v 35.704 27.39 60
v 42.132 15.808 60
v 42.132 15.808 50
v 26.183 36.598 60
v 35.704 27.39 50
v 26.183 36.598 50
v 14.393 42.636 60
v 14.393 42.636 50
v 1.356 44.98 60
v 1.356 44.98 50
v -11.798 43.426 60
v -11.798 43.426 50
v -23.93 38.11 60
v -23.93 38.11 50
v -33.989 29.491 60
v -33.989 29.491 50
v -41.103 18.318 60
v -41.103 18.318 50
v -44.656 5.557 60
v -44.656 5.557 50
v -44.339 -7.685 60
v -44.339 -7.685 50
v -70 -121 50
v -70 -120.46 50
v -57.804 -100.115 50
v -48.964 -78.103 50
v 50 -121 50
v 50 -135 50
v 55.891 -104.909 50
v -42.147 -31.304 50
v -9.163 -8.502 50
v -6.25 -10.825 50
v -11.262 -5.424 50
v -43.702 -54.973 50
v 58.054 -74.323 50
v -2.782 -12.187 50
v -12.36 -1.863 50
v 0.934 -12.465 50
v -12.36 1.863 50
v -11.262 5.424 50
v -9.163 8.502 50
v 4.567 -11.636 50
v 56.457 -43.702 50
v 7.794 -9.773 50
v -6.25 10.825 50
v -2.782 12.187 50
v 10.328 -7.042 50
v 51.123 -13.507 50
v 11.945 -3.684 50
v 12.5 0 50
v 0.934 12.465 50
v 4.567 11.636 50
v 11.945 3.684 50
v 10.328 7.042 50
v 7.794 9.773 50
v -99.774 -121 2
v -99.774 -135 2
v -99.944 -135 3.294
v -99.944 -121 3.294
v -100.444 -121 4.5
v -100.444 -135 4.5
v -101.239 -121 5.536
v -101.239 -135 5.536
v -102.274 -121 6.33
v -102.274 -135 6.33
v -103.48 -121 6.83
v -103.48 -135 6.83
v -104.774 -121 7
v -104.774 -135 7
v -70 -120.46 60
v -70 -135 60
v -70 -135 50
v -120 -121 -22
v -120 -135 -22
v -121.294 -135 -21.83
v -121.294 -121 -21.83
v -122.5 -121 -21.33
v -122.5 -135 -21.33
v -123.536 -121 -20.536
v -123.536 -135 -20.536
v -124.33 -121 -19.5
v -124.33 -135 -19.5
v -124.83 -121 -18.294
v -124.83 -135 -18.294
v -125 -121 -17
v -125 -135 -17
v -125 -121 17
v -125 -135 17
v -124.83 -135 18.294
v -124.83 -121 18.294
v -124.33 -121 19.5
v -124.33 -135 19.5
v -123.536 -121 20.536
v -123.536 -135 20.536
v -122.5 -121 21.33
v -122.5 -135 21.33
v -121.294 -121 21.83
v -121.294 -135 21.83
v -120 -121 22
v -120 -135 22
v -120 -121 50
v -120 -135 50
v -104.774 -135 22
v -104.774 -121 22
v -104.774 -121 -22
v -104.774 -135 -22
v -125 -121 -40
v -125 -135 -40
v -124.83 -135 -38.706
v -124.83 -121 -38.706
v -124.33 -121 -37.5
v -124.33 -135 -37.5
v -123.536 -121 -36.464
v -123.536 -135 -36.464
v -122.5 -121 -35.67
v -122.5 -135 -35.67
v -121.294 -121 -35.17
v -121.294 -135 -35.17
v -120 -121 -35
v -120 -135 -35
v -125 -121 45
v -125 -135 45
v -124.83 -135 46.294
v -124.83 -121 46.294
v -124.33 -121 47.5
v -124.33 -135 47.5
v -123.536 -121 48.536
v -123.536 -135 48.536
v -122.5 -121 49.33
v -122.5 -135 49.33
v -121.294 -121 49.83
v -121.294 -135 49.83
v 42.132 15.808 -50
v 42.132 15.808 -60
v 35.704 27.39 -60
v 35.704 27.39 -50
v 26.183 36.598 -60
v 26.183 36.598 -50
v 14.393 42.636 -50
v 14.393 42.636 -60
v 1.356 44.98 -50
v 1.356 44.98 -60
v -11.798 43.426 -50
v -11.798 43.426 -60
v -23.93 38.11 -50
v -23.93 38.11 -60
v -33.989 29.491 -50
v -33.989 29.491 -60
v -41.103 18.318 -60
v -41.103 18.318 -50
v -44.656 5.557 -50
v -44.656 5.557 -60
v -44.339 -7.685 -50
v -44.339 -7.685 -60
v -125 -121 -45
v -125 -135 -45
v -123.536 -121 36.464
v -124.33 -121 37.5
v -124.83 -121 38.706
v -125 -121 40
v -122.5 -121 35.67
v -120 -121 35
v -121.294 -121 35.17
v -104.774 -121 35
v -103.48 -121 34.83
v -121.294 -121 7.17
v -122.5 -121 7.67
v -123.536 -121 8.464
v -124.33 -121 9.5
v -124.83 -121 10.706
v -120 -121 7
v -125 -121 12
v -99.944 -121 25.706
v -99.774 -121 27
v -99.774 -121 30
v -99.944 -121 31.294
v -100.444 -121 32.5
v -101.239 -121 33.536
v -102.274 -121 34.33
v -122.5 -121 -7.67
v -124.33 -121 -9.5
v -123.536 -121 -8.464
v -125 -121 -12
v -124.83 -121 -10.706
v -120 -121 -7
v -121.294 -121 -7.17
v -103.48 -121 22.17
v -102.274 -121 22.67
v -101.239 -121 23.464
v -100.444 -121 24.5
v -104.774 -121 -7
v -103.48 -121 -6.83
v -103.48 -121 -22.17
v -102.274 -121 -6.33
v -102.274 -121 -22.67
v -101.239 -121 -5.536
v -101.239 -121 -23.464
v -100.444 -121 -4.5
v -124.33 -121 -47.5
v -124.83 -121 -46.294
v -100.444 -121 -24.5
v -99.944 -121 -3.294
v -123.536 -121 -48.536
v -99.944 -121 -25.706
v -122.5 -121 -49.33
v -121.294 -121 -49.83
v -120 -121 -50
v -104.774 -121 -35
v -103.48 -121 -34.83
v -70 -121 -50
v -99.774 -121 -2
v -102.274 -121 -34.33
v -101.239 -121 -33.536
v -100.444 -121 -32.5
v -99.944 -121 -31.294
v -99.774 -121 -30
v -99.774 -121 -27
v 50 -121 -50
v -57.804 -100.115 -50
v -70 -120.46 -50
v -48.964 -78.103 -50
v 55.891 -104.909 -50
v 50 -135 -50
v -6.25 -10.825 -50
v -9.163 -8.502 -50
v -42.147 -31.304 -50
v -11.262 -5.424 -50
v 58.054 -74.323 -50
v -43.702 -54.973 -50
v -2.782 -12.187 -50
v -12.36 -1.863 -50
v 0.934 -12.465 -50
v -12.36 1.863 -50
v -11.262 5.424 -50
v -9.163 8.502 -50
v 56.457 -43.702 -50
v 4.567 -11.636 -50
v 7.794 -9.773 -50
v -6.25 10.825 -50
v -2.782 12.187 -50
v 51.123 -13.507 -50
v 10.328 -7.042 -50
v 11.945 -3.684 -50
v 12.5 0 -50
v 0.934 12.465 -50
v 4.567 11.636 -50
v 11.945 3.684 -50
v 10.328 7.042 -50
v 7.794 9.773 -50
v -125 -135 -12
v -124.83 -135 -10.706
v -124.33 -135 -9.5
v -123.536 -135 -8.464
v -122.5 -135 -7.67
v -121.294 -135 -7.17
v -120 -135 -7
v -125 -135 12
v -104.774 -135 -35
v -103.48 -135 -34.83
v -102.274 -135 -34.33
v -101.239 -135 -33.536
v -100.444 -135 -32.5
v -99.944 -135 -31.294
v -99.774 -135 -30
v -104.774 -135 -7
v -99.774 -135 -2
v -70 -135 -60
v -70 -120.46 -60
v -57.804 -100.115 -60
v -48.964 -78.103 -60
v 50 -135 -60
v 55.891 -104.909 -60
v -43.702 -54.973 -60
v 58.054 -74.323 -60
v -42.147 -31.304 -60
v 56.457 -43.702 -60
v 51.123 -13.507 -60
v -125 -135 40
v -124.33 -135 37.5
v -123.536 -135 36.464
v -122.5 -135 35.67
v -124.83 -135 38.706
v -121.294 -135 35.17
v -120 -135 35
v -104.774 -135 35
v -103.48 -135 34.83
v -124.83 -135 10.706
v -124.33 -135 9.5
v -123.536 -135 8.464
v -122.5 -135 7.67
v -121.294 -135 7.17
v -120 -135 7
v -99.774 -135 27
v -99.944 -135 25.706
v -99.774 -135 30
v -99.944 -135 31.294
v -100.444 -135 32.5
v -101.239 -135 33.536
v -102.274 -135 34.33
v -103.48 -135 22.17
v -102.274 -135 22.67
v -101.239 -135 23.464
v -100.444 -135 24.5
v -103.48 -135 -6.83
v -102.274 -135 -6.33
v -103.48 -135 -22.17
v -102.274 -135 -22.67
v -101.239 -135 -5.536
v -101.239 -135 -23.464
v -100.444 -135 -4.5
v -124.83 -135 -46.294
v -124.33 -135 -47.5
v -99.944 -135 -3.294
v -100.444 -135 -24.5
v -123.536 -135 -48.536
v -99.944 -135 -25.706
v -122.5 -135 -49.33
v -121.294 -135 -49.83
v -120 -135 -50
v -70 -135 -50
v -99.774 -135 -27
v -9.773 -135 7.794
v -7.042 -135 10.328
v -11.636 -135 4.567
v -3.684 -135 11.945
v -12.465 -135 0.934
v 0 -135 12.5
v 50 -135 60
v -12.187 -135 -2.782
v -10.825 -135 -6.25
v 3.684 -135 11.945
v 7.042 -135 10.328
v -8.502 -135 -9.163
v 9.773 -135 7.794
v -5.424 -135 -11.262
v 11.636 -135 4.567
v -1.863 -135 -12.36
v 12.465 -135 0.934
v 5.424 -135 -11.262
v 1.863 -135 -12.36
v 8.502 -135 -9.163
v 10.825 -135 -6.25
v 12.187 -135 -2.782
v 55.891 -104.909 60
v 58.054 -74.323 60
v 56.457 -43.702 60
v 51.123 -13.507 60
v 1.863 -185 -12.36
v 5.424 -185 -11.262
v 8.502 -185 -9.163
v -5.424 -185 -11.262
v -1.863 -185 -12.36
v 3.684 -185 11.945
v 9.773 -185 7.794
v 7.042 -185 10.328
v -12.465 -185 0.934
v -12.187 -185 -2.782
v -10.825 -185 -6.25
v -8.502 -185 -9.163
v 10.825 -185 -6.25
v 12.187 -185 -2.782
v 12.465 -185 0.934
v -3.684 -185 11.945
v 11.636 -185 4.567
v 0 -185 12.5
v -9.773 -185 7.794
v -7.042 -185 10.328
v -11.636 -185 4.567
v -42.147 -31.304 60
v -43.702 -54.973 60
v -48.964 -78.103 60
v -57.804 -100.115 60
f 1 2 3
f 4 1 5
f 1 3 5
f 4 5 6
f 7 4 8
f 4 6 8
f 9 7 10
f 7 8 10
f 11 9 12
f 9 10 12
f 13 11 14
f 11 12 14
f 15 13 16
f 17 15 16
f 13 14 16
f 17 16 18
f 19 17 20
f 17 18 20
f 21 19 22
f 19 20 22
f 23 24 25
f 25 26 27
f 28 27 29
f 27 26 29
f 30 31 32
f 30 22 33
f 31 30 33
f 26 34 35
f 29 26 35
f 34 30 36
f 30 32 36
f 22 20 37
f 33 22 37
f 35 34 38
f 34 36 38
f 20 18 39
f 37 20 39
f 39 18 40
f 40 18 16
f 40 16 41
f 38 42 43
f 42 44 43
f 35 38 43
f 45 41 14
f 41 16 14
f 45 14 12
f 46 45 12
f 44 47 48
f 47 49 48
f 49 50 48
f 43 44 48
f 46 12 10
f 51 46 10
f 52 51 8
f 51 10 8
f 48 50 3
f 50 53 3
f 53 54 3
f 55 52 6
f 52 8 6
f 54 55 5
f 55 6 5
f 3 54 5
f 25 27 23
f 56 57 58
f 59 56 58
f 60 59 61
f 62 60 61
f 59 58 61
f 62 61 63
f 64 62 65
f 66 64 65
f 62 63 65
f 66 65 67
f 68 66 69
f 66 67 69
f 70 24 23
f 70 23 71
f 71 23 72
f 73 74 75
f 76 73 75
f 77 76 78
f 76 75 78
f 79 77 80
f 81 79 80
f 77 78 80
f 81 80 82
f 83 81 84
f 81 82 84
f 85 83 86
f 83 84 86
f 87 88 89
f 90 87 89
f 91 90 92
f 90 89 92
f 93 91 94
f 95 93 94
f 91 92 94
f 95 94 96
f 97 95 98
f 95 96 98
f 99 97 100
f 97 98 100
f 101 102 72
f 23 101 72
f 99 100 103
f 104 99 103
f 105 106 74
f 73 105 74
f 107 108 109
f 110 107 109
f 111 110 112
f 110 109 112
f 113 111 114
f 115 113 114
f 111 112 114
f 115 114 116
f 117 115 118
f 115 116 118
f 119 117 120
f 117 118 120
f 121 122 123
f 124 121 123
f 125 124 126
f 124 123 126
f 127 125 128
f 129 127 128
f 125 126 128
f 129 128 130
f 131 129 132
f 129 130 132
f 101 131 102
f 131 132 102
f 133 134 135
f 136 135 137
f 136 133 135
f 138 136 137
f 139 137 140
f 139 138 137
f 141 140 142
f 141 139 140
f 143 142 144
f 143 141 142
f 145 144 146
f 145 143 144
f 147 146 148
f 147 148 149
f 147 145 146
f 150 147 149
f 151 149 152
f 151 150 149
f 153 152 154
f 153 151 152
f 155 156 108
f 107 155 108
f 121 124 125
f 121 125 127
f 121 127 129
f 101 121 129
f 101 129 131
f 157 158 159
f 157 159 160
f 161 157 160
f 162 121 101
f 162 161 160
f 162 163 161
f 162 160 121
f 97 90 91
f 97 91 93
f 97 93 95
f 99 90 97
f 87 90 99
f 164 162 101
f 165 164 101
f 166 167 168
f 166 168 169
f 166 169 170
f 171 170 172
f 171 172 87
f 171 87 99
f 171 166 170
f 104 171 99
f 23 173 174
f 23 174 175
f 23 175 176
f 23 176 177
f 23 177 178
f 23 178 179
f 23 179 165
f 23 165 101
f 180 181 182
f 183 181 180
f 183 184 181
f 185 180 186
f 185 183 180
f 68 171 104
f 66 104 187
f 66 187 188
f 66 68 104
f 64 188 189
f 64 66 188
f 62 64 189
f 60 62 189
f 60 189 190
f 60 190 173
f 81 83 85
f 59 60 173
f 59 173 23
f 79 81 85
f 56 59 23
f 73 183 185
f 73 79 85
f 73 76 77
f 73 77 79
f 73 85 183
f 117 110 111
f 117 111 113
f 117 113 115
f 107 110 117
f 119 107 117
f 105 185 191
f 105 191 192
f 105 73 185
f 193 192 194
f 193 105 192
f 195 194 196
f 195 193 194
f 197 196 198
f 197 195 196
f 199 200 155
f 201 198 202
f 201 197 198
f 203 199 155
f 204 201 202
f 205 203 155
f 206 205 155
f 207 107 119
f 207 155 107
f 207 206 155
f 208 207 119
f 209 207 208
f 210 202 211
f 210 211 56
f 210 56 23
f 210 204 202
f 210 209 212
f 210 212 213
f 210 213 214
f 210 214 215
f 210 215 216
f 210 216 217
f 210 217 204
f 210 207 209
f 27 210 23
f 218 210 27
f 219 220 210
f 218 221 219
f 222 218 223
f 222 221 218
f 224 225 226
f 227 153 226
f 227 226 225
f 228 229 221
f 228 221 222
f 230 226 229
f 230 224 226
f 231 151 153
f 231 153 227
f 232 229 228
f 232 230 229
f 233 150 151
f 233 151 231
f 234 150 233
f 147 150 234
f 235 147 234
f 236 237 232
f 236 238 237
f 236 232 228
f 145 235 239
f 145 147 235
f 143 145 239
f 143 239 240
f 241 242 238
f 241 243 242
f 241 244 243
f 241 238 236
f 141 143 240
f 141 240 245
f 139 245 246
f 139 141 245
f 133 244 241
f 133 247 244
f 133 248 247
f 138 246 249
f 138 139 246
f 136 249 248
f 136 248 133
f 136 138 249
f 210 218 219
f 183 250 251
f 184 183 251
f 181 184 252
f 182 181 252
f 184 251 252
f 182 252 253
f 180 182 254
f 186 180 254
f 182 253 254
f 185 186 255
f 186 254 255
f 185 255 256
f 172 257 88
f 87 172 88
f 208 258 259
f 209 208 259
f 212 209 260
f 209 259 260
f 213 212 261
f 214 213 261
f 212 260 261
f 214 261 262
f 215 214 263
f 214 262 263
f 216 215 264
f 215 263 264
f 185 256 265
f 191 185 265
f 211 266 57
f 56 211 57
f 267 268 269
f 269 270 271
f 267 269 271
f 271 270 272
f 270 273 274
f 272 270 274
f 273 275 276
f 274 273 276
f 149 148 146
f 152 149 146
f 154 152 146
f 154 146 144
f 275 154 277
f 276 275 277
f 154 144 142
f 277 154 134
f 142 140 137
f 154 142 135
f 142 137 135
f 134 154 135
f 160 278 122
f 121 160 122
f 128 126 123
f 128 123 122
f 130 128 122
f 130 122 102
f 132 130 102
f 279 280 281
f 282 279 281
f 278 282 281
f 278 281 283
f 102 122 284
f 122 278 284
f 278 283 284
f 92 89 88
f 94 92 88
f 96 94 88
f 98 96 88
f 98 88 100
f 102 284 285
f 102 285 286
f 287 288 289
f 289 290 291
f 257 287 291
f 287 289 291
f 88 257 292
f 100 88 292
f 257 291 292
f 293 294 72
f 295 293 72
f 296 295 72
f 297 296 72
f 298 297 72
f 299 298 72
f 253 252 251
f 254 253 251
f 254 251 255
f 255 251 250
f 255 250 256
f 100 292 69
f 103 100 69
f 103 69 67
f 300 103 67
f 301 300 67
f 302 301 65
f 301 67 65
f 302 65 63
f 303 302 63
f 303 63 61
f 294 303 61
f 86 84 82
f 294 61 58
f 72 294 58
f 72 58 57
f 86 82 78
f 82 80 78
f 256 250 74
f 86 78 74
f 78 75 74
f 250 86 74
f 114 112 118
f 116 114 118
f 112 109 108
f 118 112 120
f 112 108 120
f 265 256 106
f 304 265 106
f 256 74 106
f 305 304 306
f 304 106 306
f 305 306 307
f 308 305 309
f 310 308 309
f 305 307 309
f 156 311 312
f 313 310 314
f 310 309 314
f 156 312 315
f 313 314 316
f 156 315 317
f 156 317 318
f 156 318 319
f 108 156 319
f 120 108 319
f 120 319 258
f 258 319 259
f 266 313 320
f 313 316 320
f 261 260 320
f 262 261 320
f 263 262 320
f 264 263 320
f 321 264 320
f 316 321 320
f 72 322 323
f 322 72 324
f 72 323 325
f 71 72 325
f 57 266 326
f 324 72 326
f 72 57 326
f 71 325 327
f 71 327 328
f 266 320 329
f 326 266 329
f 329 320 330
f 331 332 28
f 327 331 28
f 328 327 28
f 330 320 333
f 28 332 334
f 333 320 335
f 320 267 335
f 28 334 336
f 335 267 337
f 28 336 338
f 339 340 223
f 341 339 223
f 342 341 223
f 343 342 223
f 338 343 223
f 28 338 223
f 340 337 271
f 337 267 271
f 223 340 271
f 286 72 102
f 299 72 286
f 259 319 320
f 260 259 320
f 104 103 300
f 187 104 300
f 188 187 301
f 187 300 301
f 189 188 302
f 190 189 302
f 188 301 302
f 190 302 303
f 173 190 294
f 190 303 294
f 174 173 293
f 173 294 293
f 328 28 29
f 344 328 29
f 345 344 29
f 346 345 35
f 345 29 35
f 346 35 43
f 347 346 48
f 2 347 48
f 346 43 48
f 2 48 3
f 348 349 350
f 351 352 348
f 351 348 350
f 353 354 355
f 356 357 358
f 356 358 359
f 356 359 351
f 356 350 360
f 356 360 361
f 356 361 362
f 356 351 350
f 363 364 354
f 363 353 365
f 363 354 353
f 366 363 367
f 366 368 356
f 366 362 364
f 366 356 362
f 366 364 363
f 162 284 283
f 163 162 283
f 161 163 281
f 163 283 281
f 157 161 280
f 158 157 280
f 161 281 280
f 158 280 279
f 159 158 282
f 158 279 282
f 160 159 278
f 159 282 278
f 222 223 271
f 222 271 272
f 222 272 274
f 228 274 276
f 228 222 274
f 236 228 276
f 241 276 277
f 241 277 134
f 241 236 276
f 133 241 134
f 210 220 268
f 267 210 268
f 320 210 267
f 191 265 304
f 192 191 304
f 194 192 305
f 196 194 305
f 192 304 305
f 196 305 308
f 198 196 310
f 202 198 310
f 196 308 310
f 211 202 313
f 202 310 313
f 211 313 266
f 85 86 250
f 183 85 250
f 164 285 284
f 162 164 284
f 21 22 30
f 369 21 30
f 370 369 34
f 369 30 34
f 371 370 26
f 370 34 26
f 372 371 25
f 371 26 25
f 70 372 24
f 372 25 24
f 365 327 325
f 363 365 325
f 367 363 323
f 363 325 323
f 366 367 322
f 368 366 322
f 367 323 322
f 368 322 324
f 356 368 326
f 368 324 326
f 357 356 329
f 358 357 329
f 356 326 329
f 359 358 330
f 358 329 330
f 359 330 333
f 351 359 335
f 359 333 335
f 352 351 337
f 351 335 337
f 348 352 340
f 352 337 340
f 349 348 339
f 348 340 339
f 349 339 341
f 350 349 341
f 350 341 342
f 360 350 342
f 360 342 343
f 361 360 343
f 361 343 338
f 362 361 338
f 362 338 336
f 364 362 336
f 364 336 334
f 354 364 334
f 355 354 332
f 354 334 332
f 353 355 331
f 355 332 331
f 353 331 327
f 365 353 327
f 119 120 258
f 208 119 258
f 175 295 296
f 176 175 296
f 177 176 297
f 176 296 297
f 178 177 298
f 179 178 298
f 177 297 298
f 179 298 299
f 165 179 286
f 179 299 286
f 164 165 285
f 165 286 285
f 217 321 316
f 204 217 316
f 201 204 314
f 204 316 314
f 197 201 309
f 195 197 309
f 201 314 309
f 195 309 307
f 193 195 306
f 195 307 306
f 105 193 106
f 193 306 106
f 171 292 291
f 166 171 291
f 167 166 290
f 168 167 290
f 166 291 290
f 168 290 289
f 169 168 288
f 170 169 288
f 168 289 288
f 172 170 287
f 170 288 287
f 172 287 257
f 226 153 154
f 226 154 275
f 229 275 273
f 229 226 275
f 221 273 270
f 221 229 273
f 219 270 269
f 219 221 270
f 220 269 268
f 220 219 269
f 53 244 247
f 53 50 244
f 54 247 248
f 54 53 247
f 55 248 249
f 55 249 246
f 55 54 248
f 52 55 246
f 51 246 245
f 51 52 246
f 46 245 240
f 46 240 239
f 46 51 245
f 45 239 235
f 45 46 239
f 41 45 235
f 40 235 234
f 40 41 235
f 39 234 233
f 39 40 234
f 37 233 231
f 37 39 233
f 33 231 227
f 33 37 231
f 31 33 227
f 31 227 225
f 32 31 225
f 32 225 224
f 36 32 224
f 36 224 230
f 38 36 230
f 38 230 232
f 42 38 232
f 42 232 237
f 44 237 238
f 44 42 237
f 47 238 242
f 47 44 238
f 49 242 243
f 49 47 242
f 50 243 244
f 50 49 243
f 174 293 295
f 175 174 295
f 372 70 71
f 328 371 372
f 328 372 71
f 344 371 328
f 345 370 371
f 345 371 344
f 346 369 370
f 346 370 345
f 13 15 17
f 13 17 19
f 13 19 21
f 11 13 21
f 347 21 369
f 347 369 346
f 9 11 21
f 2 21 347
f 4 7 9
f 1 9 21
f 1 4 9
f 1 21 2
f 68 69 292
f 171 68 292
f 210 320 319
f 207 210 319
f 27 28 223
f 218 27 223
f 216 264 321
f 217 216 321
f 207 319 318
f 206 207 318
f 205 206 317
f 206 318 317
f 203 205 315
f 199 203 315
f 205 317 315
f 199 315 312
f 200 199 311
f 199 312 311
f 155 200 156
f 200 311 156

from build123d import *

# Parameters (mm, degrees)
SKETCH1_R           = 12.5
BOSS_EXTRUDE1_DEPTH = 50
BOSS_EXTRUDE2_DEPTH = 10
BOSS_EXTRUDE3_DEPTH = 14
SKETCH4_R           = 12.5
BOSS_EXTRUDE4_DEPTH = 50


with BuildPart() as part:
    # Sketch1 → Boss-Extrude1 (new, symmetric)
    with BuildSketch(Plane.XY):
        Circle(SKETCH1_R)
    extrude(amount=BOSS_EXTRUDE1_DEPTH, both=True)

    # Sketch2 → Boss-Extrude2 (add)
    with BuildSketch(Plane.XY.offset(50)):
        with BuildLine():
            Line((0, -135), (50, -135))
            ThreePointArc((50, -135), (57.725254986, -58.987850945), (42.132117825, 15.807740116))
            ThreePointArc((42.132117825, 15.807740116), (-11.798039133, 43.425871006), (-44.338945511, -7.684914504))
            ThreePointArc((-44.338945511, -7.684914504), (-45.875603416, -66.642123234), (-70, -120.459660044))
            Line((-70, -120.459660044), (-70, -135))
            Line((-70, -135), (0, -135))
        make_face()
    boss_extrude2 = extrude(amount=BOSS_EXTRUDE2_DEPTH)

    # Mirror1: Boss-Extrude2 across plane
    add(boss_extrude2.mirror(Plane.XY))

    # Sketch3 → Boss-Extrude3 (add)
    with BuildSketch(Plane(origin=(0, -135, 0), x_dir=(-1, 0, 0), z_dir=(0, -1, 0))):
        with BuildLine():
            Line((120, 7), (104.77406241, 7))
            ThreePointArc((104.77406241, 7), (101.238528504, 5.535533906), (99.77406241, 2))
            Line((99.77406241, 2), (99.77406241, -2))
            ThreePointArc((99.77406241, -2), (101.238528504, -5.535533906), (104.77406241, -7))
            Line((104.77406241, -7), (120, -7))
            ThreePointArc((120, -7), (123.535533906, -8.464466094), (125, -12))
            Line((125, -12), (125, -17))
            ThreePointArc((125, -17), (123.535533906, -20.535533906), (120, -22))
            Line((120, -22), (104.77406241, -22))
            ThreePointArc((104.77406241, -22), (101.238528504, -23.464466094), (99.77406241, -27))
            Line((99.77406241, -27), (99.77406241, -30))
            ThreePointArc((99.77406241, -30), (101.238528504, -33.535533906), (104.77406241, -35))
            Line((104.77406241, -35), (120, -35))
            ThreePointArc((120, -35), (123.535533906, -36.464466094), (125, -40))
            Line((125, -40), (125, -45))
            ThreePointArc((125, -45), (123.535533906, -48.535533906), (120, -50))
            Line((120, -50), (-50, -50))
            Line((-50, -50), (-50, 50))
            Line((-50, 50), (120, 50))
            ThreePointArc((120, 50), (123.535533906, 48.535533906), (125, 45))
            Line((125, 45), (125, 40))
            ThreePointArc((125, 40), (123.535533906, 36.464466094), (120, 35))
            Line((120, 35), (104.77406241, 35))
            ThreePointArc((104.77406241, 35), (101.238528504, 33.535533906), (99.77406241, 30))
            Line((99.77406241, 30), (99.77406241, 27))
            ThreePointArc((99.77406241, 27), (101.238528504, 23.464466094), (104.77406241, 22))
            Line((104.77406241, 22), (120, 22))
            ThreePointArc((120, 22), (123.535533906, 20.535533906), (125, 17))
            Line((125, 17), (125, 12))
            ThreePointArc((125, 12), (123.535533906, 8.464466094), (120, 7))
        make_face()
    extrude(amount=-BOSS_EXTRUDE3_DEPTH)

    # Sketch4 → Boss-Extrude4 (add)
    with BuildSketch(Plane(origin=(0, -135, 0), x_dir=(-1, 0, 0), z_dir=(0, -1, 0))):
        Circle(SKETCH4_R)
    extrude(amount=BOSS_EXTRUDE4_DEPTH)


solid = part.part
